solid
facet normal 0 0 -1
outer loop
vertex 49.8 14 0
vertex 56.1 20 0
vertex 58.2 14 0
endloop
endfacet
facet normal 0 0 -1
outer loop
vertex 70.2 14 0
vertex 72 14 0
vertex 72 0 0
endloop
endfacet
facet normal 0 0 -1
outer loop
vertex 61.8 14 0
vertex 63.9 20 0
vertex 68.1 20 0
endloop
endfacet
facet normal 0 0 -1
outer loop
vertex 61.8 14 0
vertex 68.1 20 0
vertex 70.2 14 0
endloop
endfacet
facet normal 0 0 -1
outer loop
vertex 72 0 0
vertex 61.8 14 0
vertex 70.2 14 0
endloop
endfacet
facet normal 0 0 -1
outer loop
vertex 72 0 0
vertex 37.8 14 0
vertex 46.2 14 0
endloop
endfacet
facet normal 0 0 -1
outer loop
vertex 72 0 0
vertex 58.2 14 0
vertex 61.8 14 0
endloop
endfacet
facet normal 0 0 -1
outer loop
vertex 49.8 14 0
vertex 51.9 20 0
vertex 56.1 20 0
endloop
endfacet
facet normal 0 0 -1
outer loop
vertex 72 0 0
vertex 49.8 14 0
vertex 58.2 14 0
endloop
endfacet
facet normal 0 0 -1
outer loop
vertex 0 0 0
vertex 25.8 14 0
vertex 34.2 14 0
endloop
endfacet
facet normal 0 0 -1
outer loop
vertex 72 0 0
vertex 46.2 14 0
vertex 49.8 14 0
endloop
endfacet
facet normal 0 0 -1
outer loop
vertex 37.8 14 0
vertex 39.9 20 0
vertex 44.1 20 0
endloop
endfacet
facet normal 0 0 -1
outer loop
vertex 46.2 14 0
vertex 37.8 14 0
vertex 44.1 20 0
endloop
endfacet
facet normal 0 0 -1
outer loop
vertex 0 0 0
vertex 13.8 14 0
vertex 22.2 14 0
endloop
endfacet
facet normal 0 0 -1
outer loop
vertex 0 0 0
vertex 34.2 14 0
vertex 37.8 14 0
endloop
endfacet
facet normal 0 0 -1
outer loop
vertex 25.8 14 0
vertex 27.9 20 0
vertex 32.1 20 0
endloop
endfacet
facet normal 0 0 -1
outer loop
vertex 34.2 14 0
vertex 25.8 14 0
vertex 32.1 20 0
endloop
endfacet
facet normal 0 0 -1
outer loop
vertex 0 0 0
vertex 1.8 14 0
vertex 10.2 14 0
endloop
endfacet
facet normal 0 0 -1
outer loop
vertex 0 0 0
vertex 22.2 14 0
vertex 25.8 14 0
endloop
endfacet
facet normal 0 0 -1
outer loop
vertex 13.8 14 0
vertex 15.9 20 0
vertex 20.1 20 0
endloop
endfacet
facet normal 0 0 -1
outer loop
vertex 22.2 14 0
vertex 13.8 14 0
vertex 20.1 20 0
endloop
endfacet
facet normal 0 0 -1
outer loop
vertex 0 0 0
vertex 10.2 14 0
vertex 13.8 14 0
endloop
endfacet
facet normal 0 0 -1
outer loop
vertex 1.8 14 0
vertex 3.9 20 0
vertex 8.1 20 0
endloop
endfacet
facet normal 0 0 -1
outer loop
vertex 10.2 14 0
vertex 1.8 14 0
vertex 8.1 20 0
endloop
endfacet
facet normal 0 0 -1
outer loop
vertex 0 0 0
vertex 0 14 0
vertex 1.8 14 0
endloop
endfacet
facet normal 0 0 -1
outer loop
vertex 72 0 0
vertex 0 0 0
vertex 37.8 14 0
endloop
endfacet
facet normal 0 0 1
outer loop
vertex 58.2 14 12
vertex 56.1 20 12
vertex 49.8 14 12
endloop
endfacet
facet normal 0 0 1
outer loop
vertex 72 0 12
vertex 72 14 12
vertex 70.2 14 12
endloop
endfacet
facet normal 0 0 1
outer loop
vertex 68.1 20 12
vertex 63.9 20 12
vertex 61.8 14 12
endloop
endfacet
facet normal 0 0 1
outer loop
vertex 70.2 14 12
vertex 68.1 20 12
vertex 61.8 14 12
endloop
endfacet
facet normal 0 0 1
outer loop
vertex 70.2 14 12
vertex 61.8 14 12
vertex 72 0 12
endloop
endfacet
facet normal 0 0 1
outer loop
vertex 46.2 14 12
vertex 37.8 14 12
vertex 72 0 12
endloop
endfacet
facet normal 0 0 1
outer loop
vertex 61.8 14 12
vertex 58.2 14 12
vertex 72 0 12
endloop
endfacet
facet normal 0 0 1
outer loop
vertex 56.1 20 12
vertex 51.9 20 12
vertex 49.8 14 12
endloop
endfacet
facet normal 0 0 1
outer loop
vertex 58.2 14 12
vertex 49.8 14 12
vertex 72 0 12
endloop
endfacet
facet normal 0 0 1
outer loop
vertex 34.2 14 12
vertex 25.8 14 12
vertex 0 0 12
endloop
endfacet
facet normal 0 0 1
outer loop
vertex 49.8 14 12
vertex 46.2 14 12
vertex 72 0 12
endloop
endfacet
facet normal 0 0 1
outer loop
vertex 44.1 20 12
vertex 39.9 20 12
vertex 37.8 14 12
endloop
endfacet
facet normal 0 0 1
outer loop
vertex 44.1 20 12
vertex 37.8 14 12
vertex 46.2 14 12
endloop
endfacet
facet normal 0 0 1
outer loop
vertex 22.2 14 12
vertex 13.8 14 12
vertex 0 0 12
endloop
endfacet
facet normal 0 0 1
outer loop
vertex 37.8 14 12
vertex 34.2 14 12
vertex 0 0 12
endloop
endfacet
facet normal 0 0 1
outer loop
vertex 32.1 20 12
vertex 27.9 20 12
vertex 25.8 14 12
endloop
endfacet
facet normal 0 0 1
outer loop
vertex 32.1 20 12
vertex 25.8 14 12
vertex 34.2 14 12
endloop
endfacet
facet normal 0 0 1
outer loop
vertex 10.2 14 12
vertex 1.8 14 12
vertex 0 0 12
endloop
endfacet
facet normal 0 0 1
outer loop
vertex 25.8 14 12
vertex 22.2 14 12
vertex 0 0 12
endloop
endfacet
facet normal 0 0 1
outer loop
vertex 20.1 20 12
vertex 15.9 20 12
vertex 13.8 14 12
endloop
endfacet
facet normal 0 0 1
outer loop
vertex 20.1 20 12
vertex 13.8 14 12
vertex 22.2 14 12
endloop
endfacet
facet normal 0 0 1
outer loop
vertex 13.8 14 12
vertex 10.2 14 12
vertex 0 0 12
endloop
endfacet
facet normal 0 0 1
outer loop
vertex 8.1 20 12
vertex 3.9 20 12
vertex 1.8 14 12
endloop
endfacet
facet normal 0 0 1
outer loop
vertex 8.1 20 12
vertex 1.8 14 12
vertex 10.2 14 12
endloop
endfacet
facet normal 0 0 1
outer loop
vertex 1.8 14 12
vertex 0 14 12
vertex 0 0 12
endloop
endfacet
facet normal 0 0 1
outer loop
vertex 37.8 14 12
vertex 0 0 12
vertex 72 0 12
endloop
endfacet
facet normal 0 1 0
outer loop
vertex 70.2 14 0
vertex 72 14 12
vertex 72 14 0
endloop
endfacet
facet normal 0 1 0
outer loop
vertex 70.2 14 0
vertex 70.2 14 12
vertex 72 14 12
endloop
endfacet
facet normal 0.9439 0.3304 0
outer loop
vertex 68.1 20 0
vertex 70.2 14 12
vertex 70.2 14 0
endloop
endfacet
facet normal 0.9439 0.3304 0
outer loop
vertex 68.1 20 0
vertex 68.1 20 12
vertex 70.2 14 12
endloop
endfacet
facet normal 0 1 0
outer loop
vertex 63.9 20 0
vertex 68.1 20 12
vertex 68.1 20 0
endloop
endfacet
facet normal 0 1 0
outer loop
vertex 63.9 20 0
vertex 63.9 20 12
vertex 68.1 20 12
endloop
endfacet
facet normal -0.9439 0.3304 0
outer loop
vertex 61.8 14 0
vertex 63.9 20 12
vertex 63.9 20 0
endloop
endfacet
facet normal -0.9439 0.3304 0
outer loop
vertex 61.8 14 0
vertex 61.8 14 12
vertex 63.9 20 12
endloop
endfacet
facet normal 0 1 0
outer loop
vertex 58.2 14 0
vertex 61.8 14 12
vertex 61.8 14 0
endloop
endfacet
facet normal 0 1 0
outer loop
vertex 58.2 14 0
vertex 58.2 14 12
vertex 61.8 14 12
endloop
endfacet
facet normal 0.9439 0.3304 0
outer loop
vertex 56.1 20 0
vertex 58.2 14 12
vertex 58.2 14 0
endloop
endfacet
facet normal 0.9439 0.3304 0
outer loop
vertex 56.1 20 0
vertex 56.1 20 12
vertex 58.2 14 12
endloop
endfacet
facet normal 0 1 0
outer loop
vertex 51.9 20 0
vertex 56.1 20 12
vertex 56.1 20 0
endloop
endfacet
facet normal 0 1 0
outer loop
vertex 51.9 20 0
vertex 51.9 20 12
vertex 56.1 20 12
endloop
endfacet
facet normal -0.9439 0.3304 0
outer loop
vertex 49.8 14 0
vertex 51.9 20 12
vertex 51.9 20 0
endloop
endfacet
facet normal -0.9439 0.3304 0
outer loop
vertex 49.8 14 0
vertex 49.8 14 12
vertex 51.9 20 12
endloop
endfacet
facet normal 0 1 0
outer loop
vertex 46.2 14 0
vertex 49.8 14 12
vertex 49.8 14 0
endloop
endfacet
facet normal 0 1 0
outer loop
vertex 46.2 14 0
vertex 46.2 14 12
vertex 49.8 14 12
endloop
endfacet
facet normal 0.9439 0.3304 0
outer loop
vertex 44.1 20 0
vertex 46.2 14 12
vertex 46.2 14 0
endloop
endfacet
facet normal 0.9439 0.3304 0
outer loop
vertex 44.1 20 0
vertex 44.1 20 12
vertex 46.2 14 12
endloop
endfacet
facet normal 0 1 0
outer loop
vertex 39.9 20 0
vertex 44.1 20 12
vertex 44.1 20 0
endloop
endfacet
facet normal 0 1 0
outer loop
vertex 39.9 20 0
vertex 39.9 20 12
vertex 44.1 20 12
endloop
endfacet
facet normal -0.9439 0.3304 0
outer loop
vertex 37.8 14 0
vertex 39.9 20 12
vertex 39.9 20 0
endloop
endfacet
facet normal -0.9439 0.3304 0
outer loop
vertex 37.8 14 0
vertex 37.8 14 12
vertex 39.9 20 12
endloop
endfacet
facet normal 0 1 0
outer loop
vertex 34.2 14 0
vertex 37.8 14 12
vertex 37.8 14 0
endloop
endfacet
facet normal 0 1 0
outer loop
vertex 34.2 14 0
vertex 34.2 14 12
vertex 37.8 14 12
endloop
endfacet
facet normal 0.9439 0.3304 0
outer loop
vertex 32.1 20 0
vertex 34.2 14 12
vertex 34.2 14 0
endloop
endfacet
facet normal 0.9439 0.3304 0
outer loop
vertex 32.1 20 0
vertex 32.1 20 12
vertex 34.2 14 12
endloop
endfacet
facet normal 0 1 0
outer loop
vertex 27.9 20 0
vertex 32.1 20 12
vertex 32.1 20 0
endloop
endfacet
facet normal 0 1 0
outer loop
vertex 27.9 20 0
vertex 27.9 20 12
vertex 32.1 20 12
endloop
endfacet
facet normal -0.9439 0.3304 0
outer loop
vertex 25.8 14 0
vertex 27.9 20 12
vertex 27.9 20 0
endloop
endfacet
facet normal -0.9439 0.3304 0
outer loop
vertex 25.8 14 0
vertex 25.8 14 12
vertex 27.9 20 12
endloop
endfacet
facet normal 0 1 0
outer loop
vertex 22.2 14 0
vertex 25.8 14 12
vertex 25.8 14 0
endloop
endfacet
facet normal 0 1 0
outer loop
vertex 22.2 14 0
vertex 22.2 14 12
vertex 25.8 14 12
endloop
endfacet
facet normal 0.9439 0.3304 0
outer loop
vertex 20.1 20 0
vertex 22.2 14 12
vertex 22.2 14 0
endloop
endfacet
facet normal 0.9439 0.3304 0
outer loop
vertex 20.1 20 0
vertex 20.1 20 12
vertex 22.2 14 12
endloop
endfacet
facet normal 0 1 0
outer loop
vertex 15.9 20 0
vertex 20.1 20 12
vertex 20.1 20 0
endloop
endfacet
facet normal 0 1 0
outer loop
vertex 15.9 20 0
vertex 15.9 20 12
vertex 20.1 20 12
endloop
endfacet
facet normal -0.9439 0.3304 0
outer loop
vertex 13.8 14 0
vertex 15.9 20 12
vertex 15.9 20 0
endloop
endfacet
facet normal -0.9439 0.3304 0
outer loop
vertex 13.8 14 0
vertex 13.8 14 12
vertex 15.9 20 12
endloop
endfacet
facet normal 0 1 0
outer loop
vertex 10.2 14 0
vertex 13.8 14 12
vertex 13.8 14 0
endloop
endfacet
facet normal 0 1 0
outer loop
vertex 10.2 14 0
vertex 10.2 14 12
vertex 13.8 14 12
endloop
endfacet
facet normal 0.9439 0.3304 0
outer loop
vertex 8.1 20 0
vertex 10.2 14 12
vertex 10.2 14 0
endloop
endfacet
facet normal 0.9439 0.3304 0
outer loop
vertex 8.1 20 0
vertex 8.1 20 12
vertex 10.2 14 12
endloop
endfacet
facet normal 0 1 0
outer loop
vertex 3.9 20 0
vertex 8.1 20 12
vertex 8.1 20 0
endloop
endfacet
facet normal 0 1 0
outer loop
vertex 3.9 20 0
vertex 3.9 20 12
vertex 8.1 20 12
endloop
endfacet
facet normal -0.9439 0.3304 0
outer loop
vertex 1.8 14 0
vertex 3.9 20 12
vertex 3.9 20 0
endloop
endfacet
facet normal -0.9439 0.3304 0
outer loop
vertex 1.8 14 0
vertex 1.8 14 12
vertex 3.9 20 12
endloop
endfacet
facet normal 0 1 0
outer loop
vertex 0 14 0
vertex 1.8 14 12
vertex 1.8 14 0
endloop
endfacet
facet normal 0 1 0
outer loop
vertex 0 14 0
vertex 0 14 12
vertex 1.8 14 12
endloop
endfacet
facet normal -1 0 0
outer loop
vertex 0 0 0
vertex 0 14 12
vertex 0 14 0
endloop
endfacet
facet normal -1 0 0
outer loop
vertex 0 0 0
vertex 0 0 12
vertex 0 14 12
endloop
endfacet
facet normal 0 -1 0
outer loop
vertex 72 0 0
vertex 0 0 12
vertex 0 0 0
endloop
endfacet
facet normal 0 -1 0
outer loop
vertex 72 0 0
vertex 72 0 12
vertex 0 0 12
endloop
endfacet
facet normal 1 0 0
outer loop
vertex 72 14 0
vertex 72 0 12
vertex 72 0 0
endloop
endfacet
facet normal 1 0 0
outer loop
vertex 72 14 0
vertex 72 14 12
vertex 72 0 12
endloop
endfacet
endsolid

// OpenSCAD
$fn = 32;

// ----------------------------------------------------------------------
// Gear rack: 6 teeth, pitch 12 mm
// ----------------------------------------------------------------------

// --- parameters (mm) ---
teeth = 6;                // number of teeth
pitch = 12;               // tooth pitch, X
root_w = 8.4;             // tooth width at the root
tip_w = 4.2;              // tooth width at the tip
base_h = 14;              // rack body height, Y
tooth_h = 6;              // tooth height above the body
plate_t = 12;             // rack width, Z (extrusion height)

rack_l = teeth * pitch;  // overall length
total_h = base_h + tooth_h;  // overall height

profile = [[0, 0], [72, 0], [72, 14], [70.2, 14], [68.1, 20], [63.9, 20], [61.8, 14], [58.2, 14], [56.1, 20], [51.9, 20], [49.8, 14], [46.2, 14], [44.1, 20], [39.9, 20], [37.8, 14], [34.2, 14], [32.1, 20], [27.9, 20], [25.8, 14], [22.2, 14], [20.1, 20], [15.9, 20], [13.8, 14], [10.2, 14], [8.1, 20], [3.9, 20], [1.8, 14], [0, 14]];  // primary outline, 28 points, counter clockwise

// --- the one profile operation ---
linear_extrude(height = plate_t) polygon(points = profile);
